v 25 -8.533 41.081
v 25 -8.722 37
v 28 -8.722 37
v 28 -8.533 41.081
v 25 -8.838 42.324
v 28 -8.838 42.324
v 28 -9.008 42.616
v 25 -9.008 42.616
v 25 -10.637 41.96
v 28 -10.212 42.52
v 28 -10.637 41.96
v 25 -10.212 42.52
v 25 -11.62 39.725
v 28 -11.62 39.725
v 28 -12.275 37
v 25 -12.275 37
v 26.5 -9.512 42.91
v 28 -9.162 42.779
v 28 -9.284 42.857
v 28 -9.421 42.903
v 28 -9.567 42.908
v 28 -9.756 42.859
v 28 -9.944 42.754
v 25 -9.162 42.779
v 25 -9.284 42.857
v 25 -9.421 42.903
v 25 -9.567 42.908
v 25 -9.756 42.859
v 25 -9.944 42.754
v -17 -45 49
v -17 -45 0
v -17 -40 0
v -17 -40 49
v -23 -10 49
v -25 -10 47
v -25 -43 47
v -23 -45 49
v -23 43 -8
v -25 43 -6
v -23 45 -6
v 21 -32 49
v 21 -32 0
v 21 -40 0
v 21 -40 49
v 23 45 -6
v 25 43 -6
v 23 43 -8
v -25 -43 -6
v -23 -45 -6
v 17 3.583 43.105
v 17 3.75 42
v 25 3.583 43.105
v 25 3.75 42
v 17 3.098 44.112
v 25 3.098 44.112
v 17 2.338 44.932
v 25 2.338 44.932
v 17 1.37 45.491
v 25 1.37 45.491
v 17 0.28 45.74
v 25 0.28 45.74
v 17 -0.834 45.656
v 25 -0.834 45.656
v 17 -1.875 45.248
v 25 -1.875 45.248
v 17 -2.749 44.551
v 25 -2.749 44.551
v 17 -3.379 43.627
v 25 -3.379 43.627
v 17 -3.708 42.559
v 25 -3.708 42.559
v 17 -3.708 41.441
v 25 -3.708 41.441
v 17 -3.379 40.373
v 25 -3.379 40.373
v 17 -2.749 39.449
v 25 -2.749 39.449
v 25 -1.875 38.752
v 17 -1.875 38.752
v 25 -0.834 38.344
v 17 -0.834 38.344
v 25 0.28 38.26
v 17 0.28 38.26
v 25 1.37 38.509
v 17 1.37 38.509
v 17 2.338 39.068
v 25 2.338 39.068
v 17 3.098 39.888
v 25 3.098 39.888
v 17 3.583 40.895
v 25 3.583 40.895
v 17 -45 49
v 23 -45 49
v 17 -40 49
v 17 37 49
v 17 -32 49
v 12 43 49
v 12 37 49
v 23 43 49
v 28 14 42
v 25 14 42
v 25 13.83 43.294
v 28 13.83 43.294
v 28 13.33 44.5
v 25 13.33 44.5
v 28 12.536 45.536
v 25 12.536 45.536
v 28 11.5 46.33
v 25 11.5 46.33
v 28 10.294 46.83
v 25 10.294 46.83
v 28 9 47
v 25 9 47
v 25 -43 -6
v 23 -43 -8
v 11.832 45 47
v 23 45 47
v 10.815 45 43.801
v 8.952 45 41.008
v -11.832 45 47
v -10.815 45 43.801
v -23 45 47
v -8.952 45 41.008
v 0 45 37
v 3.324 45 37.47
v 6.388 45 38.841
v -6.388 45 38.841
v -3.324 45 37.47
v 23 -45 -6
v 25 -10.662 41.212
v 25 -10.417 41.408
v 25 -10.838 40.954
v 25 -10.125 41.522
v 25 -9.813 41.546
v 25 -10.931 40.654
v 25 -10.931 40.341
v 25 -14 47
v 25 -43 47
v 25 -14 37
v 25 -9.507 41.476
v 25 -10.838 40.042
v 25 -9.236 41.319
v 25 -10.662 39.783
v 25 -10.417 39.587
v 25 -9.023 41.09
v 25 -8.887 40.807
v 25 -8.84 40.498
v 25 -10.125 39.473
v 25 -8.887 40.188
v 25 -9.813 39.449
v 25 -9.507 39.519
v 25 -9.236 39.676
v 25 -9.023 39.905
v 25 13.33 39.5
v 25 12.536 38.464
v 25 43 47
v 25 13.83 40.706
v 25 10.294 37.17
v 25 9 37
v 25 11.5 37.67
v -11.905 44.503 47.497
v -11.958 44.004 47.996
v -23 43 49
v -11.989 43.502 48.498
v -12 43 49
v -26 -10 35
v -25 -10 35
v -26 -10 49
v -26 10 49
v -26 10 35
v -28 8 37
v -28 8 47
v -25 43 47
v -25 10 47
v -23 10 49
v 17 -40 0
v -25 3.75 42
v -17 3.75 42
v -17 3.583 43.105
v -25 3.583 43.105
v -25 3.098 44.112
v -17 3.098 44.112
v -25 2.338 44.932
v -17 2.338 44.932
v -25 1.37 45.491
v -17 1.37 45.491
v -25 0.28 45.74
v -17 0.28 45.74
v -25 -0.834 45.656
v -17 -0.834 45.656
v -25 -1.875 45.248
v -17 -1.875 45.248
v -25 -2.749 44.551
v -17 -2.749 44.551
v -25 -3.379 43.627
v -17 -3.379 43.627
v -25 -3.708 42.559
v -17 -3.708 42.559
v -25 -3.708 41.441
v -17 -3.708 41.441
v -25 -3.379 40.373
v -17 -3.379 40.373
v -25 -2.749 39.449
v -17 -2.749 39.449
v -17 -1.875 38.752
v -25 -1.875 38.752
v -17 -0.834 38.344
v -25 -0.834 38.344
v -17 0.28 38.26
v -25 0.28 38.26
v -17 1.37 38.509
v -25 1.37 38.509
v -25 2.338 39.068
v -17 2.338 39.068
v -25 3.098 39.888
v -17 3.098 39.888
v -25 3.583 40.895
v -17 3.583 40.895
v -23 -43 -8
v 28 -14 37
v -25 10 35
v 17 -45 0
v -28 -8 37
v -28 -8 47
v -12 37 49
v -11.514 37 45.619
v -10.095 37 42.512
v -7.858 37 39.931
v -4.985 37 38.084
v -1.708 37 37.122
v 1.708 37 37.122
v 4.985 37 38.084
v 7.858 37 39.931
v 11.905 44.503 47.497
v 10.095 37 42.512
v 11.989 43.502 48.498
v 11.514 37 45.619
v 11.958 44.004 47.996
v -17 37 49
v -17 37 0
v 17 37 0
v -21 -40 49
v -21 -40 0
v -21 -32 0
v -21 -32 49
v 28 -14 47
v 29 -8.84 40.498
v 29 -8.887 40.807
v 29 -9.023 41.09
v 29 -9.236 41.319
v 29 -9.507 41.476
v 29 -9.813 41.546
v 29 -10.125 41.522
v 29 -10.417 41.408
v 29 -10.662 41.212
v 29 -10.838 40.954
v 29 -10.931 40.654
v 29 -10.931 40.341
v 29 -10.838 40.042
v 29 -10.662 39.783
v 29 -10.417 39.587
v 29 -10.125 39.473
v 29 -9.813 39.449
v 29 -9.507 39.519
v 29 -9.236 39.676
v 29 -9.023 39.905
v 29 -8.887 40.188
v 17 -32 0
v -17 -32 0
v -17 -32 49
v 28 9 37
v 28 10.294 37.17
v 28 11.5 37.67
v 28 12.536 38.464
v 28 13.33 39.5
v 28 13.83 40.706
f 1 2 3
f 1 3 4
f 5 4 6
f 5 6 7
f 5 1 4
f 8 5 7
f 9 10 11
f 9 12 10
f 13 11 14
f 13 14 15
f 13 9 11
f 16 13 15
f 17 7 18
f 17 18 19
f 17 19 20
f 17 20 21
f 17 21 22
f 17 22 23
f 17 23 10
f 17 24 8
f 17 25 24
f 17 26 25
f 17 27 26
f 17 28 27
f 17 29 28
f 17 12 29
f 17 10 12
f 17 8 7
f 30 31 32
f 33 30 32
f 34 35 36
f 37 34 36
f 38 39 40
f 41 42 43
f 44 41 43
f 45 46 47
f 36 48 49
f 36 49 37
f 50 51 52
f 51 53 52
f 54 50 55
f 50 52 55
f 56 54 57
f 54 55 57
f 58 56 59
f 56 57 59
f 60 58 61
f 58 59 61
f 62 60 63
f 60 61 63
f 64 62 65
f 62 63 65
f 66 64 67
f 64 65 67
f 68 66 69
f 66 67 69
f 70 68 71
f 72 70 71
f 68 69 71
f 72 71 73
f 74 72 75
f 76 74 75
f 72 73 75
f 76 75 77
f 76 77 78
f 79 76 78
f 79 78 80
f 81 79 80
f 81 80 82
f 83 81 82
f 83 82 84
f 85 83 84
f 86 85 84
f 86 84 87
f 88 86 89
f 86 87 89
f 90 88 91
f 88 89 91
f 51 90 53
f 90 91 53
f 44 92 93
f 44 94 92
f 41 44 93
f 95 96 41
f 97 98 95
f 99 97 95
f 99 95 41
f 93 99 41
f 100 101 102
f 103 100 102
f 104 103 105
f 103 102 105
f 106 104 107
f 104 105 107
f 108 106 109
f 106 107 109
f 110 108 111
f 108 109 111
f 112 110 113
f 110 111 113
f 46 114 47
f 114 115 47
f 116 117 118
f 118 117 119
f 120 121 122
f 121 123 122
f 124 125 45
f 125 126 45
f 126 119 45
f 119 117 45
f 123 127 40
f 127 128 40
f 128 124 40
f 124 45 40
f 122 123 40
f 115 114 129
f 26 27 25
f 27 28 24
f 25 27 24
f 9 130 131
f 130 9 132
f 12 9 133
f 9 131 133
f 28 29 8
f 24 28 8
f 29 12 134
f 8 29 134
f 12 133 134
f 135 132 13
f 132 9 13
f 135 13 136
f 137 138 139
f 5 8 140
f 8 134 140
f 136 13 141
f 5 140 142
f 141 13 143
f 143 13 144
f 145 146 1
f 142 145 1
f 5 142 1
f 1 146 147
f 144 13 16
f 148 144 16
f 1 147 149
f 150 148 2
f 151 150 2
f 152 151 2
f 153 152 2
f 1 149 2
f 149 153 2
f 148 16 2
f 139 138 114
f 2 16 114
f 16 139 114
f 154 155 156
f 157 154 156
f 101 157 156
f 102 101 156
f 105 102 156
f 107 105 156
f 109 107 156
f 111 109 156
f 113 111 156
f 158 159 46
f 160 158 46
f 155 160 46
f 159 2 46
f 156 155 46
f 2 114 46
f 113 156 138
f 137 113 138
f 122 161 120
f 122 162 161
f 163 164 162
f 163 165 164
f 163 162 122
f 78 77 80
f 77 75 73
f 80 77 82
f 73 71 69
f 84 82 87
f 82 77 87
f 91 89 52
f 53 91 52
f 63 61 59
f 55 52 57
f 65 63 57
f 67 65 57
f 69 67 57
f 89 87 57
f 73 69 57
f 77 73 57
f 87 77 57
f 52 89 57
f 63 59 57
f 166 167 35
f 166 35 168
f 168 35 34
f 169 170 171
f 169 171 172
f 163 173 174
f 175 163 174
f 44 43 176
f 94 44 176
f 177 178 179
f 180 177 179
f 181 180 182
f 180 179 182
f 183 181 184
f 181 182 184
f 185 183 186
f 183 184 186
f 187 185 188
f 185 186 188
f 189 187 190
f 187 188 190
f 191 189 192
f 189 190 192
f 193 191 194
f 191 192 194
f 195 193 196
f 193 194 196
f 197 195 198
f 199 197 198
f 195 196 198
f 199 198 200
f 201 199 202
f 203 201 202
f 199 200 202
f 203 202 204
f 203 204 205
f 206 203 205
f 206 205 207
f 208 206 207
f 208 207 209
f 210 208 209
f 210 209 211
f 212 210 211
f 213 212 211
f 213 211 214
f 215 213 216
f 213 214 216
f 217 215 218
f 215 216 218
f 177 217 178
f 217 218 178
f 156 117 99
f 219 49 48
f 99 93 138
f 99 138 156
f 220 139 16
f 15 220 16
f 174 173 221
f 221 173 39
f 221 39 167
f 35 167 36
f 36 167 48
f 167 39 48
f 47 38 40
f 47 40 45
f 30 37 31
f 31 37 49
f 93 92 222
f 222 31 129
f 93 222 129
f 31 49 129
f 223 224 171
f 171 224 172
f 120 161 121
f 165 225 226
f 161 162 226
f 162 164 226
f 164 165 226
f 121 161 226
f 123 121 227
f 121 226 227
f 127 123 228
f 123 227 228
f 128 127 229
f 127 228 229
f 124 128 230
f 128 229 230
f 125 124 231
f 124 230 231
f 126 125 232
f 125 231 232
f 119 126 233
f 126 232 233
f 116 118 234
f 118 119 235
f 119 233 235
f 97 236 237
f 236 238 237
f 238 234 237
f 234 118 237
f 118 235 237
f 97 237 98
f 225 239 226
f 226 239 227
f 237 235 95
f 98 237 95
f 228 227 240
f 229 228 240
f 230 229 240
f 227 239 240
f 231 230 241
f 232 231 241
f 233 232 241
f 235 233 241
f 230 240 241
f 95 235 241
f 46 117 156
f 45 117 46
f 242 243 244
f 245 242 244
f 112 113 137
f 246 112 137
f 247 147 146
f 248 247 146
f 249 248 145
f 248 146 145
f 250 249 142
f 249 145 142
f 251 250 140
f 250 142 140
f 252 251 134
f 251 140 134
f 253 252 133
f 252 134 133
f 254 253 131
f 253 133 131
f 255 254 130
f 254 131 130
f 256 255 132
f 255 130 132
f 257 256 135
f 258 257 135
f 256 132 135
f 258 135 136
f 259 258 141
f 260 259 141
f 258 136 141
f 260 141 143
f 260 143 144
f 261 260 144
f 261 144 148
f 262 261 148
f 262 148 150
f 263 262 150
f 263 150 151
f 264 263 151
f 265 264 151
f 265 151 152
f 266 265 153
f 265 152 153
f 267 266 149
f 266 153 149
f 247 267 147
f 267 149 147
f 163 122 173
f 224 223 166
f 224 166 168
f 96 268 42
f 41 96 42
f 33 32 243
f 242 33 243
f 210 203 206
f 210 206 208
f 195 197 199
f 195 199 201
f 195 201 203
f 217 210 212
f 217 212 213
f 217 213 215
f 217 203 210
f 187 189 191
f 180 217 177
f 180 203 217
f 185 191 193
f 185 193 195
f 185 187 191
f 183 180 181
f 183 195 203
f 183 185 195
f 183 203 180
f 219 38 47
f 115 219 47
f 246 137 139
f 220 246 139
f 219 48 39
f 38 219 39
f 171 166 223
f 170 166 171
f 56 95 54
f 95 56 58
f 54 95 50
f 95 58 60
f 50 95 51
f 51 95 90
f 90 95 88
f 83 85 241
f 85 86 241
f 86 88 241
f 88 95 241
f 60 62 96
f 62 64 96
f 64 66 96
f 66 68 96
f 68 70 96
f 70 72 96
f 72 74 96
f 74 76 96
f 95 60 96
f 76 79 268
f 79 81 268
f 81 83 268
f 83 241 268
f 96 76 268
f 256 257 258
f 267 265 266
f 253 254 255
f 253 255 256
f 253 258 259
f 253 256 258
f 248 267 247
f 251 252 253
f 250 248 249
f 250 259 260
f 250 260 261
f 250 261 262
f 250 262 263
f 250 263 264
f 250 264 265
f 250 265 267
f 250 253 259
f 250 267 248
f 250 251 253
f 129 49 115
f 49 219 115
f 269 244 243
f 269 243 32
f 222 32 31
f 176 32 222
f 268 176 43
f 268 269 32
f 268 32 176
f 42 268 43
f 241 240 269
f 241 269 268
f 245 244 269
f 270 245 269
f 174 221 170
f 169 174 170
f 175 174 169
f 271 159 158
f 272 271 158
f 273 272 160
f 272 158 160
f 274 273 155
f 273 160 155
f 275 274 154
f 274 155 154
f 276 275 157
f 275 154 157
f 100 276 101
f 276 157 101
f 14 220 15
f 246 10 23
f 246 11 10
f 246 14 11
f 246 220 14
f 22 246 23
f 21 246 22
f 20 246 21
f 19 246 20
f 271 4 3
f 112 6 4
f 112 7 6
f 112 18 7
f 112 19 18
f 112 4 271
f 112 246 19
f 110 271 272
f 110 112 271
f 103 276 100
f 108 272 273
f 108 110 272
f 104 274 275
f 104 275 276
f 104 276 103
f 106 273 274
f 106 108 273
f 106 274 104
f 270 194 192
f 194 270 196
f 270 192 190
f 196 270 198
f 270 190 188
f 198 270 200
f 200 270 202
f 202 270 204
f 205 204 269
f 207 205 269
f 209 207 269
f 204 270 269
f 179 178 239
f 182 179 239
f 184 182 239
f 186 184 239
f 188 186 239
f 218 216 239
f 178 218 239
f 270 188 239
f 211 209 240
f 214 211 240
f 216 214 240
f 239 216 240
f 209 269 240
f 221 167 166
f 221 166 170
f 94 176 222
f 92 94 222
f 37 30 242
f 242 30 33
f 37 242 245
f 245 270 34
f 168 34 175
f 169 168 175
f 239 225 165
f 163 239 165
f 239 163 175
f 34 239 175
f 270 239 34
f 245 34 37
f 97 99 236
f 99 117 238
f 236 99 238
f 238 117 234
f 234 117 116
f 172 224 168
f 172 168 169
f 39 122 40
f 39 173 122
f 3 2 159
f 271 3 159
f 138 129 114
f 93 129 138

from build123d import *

# Parameters (mm, degrees)
F0_W      = 50
F0_H      = 90
F1_DEPTH  = 8
F3_DEPTH  = 49
F4_R      = 3.75
F5_DEPTH  = 25
F7_DEPTH  = 50
F9_START  = -25
F8_W      = 20
F8_H      = 14
F9_DEPTH  = 3
F11_START = 25
F11_DEPTH = 3
F13_START = 25
F12_R     = 1.0510148408
F13_DEPTH = 4
F14_SIZE  = 1.99999


# Not quite as in the source:
# - a fillet or chamfer is up to 0.001 mm smaller than in the source, because OpenCascade refuses the exact size


with BuildPart() as f1:
    # F0 (on Top) → F1 (new body)
    with BuildSketch(Plane.XY):
        Rectangle(F0_W, F0_H)
    extrude(amount=-F1_DEPTH)

    # F2 (on Top) → F3 (join)
    with BuildSketch(Plane.XY):
        Polygon((-17, 45), (-25, 45), (-25, 37), (-25, -45), (-17, -45), (-17, -40), (-21, -40), (-21, -32), (-17, -32), (-17, 37), (17, 37), (17, -32), (21, -32), (21, -40), (17, -40), (17, -45), (25, -45), (25, 37), (25, 45), (17, 45), align=None)
    extrude(amount=F3_DEPTH)

    # F4 (on Right) → F5 (cut, symmetric)
    with BuildSketch(Plane.YZ):
        with Locations((0, 42)):
            Circle(F4_R)
    extrude(amount=F5_DEPTH, both=True, mode=Mode.SUBTRACT)

    # F6 (on Front) → F7 (cut)
    with BuildSketch(Plane.XZ):
        with BuildLine():
            ThreePointArc((-12, 49), (0, 37), (12, 49))
            Line((12, 49), (-12, 49))
        make_face()
    extrude(amount=-F7_DEPTH, mode=Mode.SUBTRACT)

    # F8 (on Right) → F9 (join)
    with BuildSketch(Plane.YZ.offset(F9_START)):
        with Locations((0, 42)):
            Rectangle(F8_W, F8_H)
    extrude(amount=-F9_DEPTH)

    # F10 (on Right) → F11 (join)
    with BuildSketch(Plane.YZ.offset(F11_START)):
        with BuildLine():
            ThreePointArc((14, 42), (12.5355339059, 45.5355339059), (9, 47))
            Line((9, 47), (-14, 47))
            Line((-14, 47), (-14, 37))
            Line((-14, 37), (-12.275, 37))
            add(Edge.make_bspline(
                [(-8.722, 37), (-7.7358158763, 42.9104981706), (-9.5123158763, 42.9104981706), (-11.2888158763, 42.9104981706), (-12.275, 37)],
                knots=[4.765680137, 4.765680137, 4.765680137, 6.3364764638, 6.3364764638, 7.9072727906, 7.9072727906, 7.9072727906], degree=2, weights=[1, 0.7071067812, 1, 0.7071067812, 1]))
            Line((-8.722, 37), (9, 37))
            ThreePointArc((9, 37), (12.5355339059, 38.4644660941), (14, 42))
        make_face()
    extrude(amount=F11_DEPTH)

    # F12 (on Right) → F13 (join)
    with BuildSketch(Plane.YZ.offset(F13_START)):
        with Locations((-9.8914606497, 40.4975526035)):
            Circle(F12_R)
    extrude(amount=F13_DEPTH)

    # F14 (size 2 in the source; OpenCascade refuses exactly that, so slightly less here)
    f14_edges = [f1.edges().sort_by_distance(p)[0] for p in [
        (25, 0, -8),
        (25, -45, 20.5),
        (0, -45, -8),
        (-25, -45, 20.5),
        (-25, 0, -8),
        (-25, 45, 20.5),
        (25, 45, 20.5),
        (0, 45, -8),
        (-28, 0, 49),
        (-18.5, 45, 49),
        (18.5, 45, 49),
        (25, 0, 49),
        (-25, 27.5, 49),
        (-25, -27.5, 49),
        (-28, 10, 42),
        (-28, 0, 35),
        (-28, -10, 42),
    ]]
    chamfer(f14_edges, length=F14_SIZE)


solid = f1.part
